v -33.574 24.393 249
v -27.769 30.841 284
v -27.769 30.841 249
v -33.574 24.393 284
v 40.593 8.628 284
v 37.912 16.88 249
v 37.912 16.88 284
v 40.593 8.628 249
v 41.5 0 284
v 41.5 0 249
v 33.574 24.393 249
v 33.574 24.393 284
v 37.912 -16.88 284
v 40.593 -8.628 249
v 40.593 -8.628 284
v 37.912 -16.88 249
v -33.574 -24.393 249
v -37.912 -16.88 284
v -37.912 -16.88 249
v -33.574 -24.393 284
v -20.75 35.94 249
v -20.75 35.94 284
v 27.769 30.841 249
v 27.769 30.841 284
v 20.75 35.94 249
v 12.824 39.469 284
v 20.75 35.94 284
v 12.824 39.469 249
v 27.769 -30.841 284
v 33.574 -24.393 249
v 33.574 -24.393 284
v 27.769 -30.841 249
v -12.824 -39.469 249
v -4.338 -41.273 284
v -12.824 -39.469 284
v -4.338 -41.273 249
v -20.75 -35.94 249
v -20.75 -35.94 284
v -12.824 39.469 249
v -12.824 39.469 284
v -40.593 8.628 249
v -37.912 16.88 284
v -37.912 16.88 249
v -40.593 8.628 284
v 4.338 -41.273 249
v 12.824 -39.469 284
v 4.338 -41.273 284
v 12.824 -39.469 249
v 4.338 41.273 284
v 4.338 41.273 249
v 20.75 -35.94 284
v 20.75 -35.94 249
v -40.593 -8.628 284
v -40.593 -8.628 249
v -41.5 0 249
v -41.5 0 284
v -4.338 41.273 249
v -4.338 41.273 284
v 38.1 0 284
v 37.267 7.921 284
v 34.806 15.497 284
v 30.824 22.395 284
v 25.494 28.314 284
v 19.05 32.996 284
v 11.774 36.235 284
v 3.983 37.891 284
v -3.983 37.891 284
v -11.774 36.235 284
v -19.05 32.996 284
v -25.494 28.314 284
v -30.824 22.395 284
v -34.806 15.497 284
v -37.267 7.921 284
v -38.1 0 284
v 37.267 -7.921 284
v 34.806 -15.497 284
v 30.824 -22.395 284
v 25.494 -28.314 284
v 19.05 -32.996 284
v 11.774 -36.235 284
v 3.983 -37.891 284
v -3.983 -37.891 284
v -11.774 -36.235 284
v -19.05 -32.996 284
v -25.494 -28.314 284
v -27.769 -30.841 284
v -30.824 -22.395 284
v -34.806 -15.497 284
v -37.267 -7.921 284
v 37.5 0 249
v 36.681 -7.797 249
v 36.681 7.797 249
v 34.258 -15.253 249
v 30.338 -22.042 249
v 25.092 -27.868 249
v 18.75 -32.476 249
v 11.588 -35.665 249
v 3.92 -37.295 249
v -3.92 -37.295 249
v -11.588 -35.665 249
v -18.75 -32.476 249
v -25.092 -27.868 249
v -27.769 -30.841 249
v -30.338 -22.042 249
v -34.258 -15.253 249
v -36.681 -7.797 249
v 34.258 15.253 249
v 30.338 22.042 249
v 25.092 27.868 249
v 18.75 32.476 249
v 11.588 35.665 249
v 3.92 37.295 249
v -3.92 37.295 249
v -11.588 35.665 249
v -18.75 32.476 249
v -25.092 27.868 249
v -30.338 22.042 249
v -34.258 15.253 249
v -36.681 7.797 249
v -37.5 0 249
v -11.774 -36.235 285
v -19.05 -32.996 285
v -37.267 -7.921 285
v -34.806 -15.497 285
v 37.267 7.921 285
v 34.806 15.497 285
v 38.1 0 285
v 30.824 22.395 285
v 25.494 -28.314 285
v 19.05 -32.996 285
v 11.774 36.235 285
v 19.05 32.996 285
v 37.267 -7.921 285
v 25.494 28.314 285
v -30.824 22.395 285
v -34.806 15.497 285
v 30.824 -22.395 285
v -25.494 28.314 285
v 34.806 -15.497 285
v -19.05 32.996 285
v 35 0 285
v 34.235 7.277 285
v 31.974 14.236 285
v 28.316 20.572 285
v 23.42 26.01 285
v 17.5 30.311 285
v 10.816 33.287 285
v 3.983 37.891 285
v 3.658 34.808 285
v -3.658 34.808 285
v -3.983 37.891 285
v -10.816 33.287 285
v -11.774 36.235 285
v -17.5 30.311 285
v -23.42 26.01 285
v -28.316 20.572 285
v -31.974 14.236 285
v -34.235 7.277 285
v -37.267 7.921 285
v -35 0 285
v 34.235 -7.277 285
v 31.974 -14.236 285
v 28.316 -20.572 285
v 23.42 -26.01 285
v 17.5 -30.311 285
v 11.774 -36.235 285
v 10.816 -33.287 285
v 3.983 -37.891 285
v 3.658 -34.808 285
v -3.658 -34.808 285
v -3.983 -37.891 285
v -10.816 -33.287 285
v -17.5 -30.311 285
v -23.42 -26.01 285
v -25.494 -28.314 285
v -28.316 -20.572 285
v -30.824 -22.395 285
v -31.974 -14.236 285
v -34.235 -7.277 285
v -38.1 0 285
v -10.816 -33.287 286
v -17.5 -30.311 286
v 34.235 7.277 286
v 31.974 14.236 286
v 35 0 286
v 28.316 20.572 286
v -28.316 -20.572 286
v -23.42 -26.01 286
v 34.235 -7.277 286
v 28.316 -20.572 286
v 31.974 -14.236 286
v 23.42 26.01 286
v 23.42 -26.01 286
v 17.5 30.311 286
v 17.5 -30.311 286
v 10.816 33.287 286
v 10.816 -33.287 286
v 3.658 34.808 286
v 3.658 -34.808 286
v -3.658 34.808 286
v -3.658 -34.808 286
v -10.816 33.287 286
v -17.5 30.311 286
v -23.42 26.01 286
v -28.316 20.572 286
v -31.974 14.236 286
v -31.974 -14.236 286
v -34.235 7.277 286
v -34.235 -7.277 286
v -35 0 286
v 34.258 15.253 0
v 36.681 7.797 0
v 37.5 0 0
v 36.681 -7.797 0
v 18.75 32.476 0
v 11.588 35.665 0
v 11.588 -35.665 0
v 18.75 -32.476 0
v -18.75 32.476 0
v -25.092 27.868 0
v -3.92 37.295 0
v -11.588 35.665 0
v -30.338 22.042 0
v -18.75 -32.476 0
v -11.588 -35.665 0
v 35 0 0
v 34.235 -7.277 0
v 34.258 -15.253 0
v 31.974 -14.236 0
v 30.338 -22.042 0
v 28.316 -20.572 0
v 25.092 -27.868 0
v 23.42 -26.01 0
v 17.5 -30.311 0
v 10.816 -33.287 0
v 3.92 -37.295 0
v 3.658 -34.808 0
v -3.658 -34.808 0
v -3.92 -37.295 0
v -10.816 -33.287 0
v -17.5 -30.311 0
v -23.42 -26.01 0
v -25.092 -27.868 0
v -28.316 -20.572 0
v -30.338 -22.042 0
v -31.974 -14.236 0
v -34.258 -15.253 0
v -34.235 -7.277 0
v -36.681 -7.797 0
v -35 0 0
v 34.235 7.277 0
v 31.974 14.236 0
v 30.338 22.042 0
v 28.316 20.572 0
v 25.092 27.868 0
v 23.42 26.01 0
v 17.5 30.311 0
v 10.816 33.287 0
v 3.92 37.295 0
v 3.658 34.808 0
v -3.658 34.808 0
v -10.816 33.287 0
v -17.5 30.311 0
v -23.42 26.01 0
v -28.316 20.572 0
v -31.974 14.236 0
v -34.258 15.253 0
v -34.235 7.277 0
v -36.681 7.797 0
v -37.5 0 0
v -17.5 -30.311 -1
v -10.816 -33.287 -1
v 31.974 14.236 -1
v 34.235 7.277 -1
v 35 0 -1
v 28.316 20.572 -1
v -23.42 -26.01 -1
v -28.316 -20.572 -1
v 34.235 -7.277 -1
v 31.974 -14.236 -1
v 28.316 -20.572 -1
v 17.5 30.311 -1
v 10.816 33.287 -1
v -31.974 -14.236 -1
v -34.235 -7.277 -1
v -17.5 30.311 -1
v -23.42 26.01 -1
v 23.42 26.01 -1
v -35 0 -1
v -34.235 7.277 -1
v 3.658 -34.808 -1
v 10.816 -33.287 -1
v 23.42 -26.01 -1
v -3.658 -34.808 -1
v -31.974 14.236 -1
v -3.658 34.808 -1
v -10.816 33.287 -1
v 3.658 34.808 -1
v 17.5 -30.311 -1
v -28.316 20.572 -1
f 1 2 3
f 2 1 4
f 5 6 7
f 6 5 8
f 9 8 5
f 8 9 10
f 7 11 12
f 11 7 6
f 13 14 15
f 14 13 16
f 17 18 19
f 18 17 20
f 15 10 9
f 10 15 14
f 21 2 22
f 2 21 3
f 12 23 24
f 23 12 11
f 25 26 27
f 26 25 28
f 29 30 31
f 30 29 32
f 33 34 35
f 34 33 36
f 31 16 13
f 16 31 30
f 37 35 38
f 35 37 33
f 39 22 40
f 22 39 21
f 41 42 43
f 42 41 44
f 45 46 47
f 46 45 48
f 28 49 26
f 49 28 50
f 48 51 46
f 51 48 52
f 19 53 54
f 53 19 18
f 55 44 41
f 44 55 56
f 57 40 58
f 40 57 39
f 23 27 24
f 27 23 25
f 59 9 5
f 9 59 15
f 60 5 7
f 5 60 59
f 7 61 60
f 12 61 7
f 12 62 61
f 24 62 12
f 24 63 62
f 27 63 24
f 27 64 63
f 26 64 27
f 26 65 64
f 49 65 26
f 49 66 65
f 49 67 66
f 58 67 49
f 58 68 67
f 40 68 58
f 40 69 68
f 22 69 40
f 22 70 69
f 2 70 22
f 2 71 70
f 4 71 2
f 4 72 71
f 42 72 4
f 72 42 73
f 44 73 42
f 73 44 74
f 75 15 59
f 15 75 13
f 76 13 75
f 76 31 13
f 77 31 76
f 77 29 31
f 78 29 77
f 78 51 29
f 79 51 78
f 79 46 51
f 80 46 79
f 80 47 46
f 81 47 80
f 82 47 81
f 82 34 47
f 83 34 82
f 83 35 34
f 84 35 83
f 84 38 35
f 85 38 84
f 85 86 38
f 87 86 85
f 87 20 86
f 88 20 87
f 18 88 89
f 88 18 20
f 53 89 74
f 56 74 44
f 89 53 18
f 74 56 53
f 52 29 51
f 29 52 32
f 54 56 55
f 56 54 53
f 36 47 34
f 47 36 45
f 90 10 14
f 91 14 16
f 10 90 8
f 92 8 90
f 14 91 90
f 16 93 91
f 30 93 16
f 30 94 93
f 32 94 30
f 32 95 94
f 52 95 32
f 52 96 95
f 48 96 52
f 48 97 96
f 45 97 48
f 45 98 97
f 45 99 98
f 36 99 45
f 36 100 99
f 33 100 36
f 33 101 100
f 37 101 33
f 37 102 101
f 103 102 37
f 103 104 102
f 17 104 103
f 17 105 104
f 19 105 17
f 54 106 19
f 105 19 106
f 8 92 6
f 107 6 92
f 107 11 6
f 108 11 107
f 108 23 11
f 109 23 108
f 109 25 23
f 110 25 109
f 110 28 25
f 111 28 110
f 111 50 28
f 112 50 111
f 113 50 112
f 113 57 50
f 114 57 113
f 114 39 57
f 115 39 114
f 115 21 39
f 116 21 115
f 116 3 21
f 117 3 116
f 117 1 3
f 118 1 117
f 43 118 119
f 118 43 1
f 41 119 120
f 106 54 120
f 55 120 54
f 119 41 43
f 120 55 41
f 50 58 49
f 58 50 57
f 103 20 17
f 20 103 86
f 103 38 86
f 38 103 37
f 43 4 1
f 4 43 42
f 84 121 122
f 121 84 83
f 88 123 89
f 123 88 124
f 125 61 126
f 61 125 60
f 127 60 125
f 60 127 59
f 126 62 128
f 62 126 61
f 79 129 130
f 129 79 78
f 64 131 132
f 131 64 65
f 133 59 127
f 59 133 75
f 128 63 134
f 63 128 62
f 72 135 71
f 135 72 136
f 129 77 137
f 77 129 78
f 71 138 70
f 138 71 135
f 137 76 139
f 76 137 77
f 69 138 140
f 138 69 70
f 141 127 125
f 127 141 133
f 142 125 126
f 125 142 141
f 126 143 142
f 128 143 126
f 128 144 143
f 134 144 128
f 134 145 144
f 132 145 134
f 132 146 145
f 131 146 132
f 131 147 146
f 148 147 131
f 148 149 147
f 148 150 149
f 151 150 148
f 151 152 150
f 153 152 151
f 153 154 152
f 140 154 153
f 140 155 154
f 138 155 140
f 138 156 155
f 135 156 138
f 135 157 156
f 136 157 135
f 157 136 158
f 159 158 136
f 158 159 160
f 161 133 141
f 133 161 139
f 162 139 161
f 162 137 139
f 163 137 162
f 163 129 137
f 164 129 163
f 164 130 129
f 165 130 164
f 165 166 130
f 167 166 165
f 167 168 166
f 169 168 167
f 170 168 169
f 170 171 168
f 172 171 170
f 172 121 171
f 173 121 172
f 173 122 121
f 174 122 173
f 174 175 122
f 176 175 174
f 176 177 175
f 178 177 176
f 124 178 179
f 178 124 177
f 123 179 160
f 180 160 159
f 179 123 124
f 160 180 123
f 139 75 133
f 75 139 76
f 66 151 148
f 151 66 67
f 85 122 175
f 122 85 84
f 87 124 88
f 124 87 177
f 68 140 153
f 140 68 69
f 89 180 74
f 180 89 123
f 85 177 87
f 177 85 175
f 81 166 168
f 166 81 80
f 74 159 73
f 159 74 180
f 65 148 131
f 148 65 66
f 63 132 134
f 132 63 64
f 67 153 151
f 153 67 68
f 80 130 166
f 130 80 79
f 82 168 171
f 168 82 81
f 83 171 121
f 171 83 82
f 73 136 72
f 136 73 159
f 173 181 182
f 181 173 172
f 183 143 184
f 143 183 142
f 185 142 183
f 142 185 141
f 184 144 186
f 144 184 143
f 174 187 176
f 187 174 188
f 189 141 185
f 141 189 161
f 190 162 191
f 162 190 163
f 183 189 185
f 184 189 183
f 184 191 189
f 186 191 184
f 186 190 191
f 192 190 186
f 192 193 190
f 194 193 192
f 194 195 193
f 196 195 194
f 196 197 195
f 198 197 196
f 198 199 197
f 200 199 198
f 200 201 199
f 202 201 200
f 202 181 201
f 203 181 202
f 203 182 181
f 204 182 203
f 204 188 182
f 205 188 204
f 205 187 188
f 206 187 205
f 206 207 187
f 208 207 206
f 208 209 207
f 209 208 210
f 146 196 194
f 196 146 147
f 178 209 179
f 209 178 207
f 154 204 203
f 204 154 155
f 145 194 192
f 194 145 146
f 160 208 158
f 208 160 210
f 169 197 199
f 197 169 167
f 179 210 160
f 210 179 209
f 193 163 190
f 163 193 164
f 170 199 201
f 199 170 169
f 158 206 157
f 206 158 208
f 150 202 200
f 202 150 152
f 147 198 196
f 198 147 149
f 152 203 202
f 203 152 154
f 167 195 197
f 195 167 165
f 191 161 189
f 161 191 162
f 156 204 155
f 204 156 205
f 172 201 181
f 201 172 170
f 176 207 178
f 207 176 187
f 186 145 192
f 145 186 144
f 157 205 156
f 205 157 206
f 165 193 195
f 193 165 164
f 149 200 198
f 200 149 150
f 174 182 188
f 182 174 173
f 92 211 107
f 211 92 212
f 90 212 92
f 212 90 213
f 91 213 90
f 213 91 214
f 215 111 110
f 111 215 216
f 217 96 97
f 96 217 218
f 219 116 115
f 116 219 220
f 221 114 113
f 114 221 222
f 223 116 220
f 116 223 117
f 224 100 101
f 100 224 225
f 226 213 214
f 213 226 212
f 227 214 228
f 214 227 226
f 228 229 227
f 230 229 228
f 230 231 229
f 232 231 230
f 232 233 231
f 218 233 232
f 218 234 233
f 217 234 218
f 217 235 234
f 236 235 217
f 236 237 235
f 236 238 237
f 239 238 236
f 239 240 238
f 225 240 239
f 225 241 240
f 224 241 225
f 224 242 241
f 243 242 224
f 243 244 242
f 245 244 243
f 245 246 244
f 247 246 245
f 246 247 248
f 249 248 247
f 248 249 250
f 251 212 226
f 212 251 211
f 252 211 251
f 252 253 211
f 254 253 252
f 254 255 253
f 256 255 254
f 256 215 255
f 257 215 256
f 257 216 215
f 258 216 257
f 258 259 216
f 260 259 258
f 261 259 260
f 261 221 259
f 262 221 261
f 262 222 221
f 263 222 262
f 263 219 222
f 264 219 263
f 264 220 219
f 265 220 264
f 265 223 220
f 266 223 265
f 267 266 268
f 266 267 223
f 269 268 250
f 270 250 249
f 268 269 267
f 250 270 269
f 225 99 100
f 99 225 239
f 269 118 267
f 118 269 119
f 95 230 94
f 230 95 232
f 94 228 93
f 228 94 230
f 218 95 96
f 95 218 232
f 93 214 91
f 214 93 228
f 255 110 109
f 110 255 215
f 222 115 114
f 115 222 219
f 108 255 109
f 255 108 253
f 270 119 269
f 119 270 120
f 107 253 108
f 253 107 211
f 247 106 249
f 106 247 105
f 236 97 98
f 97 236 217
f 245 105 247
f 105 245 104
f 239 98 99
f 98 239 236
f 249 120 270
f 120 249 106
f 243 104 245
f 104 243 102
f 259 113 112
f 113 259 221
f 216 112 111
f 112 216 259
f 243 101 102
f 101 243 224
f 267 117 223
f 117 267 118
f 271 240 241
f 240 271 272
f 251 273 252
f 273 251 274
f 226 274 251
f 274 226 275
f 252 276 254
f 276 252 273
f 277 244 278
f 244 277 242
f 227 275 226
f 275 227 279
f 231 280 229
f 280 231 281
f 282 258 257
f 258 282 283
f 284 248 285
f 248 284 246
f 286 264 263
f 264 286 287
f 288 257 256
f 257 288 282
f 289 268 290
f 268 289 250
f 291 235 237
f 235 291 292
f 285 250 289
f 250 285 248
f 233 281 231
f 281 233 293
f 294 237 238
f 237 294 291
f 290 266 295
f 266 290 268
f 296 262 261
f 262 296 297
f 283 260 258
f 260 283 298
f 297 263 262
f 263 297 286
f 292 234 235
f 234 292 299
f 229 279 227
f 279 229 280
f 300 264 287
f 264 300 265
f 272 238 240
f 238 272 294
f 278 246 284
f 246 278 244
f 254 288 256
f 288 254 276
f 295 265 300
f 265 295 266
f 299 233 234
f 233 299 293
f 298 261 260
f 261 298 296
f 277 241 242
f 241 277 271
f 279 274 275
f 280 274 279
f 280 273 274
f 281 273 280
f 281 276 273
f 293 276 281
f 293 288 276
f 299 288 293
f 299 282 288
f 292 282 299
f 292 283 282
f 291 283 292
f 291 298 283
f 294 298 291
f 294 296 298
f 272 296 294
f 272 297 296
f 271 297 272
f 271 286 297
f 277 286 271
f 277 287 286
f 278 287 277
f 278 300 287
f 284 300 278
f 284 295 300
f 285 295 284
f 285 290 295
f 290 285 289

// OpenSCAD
// Parameters
pipe_standard = 1; //[1:1:1]
nominal_diameter = 75; //[40:150:1]
length_mm = 250; //[125:500:1]
end_fitting = 1; //[0:1:1]
wall_thickness = 2.5; //[1.2:5:0.1]
od = 75; //[40:150:1]
overlap = 1; //[0.5:2:0.1]
fitting_length = 35; //[15:70:1]
fitting_wall_extra = 1.5; //[0.5:4:0.1]
fitting_od_extra = 4; //[1:10:0.5]
socket_depth = 25; //[10:60:1]
socket_clearance = 0.6; //[0.2:1.5:0.1]

// Module for HT Pipe
module ht_pipe() {
  color([0.85, 0.85, 0.8]) { // PVC color
    // Outer pipe
    cylinder(h=length_mm, r=od/2, center=false);
    
    // Inner pipe (subtracted)
    translate([0, 0, -overlap])
      cylinder(h=length_mm + 2*overlap, r=od/2 - wall_thickness, center=false);
    
    // Fitting outer cylinder
    if (end_fitting) {
      translate([0, 0, length_mm - overlap])
        cylinder(h=fitting_length, r=od/2 + fitting_od_extra, center=false);
      
      // Fitting socket void (subtracted)
      translate([0, 0, length_mm + fitting_length - socket_depth - overlap])
        cylinder(h=socket_depth + overlap, r=od/2 + socket_clearance, center=false);
      
      // Fitting through void (subtracted)
      translate([0, 0, length_mm - overlap])
        cylinder(h=fitting_length + 2*overlap, r=od/2 - wall_thickness, center=false);
    }
  }
}

// Assembly
module assembly() {
  ht_pipe();
}

assembly();
